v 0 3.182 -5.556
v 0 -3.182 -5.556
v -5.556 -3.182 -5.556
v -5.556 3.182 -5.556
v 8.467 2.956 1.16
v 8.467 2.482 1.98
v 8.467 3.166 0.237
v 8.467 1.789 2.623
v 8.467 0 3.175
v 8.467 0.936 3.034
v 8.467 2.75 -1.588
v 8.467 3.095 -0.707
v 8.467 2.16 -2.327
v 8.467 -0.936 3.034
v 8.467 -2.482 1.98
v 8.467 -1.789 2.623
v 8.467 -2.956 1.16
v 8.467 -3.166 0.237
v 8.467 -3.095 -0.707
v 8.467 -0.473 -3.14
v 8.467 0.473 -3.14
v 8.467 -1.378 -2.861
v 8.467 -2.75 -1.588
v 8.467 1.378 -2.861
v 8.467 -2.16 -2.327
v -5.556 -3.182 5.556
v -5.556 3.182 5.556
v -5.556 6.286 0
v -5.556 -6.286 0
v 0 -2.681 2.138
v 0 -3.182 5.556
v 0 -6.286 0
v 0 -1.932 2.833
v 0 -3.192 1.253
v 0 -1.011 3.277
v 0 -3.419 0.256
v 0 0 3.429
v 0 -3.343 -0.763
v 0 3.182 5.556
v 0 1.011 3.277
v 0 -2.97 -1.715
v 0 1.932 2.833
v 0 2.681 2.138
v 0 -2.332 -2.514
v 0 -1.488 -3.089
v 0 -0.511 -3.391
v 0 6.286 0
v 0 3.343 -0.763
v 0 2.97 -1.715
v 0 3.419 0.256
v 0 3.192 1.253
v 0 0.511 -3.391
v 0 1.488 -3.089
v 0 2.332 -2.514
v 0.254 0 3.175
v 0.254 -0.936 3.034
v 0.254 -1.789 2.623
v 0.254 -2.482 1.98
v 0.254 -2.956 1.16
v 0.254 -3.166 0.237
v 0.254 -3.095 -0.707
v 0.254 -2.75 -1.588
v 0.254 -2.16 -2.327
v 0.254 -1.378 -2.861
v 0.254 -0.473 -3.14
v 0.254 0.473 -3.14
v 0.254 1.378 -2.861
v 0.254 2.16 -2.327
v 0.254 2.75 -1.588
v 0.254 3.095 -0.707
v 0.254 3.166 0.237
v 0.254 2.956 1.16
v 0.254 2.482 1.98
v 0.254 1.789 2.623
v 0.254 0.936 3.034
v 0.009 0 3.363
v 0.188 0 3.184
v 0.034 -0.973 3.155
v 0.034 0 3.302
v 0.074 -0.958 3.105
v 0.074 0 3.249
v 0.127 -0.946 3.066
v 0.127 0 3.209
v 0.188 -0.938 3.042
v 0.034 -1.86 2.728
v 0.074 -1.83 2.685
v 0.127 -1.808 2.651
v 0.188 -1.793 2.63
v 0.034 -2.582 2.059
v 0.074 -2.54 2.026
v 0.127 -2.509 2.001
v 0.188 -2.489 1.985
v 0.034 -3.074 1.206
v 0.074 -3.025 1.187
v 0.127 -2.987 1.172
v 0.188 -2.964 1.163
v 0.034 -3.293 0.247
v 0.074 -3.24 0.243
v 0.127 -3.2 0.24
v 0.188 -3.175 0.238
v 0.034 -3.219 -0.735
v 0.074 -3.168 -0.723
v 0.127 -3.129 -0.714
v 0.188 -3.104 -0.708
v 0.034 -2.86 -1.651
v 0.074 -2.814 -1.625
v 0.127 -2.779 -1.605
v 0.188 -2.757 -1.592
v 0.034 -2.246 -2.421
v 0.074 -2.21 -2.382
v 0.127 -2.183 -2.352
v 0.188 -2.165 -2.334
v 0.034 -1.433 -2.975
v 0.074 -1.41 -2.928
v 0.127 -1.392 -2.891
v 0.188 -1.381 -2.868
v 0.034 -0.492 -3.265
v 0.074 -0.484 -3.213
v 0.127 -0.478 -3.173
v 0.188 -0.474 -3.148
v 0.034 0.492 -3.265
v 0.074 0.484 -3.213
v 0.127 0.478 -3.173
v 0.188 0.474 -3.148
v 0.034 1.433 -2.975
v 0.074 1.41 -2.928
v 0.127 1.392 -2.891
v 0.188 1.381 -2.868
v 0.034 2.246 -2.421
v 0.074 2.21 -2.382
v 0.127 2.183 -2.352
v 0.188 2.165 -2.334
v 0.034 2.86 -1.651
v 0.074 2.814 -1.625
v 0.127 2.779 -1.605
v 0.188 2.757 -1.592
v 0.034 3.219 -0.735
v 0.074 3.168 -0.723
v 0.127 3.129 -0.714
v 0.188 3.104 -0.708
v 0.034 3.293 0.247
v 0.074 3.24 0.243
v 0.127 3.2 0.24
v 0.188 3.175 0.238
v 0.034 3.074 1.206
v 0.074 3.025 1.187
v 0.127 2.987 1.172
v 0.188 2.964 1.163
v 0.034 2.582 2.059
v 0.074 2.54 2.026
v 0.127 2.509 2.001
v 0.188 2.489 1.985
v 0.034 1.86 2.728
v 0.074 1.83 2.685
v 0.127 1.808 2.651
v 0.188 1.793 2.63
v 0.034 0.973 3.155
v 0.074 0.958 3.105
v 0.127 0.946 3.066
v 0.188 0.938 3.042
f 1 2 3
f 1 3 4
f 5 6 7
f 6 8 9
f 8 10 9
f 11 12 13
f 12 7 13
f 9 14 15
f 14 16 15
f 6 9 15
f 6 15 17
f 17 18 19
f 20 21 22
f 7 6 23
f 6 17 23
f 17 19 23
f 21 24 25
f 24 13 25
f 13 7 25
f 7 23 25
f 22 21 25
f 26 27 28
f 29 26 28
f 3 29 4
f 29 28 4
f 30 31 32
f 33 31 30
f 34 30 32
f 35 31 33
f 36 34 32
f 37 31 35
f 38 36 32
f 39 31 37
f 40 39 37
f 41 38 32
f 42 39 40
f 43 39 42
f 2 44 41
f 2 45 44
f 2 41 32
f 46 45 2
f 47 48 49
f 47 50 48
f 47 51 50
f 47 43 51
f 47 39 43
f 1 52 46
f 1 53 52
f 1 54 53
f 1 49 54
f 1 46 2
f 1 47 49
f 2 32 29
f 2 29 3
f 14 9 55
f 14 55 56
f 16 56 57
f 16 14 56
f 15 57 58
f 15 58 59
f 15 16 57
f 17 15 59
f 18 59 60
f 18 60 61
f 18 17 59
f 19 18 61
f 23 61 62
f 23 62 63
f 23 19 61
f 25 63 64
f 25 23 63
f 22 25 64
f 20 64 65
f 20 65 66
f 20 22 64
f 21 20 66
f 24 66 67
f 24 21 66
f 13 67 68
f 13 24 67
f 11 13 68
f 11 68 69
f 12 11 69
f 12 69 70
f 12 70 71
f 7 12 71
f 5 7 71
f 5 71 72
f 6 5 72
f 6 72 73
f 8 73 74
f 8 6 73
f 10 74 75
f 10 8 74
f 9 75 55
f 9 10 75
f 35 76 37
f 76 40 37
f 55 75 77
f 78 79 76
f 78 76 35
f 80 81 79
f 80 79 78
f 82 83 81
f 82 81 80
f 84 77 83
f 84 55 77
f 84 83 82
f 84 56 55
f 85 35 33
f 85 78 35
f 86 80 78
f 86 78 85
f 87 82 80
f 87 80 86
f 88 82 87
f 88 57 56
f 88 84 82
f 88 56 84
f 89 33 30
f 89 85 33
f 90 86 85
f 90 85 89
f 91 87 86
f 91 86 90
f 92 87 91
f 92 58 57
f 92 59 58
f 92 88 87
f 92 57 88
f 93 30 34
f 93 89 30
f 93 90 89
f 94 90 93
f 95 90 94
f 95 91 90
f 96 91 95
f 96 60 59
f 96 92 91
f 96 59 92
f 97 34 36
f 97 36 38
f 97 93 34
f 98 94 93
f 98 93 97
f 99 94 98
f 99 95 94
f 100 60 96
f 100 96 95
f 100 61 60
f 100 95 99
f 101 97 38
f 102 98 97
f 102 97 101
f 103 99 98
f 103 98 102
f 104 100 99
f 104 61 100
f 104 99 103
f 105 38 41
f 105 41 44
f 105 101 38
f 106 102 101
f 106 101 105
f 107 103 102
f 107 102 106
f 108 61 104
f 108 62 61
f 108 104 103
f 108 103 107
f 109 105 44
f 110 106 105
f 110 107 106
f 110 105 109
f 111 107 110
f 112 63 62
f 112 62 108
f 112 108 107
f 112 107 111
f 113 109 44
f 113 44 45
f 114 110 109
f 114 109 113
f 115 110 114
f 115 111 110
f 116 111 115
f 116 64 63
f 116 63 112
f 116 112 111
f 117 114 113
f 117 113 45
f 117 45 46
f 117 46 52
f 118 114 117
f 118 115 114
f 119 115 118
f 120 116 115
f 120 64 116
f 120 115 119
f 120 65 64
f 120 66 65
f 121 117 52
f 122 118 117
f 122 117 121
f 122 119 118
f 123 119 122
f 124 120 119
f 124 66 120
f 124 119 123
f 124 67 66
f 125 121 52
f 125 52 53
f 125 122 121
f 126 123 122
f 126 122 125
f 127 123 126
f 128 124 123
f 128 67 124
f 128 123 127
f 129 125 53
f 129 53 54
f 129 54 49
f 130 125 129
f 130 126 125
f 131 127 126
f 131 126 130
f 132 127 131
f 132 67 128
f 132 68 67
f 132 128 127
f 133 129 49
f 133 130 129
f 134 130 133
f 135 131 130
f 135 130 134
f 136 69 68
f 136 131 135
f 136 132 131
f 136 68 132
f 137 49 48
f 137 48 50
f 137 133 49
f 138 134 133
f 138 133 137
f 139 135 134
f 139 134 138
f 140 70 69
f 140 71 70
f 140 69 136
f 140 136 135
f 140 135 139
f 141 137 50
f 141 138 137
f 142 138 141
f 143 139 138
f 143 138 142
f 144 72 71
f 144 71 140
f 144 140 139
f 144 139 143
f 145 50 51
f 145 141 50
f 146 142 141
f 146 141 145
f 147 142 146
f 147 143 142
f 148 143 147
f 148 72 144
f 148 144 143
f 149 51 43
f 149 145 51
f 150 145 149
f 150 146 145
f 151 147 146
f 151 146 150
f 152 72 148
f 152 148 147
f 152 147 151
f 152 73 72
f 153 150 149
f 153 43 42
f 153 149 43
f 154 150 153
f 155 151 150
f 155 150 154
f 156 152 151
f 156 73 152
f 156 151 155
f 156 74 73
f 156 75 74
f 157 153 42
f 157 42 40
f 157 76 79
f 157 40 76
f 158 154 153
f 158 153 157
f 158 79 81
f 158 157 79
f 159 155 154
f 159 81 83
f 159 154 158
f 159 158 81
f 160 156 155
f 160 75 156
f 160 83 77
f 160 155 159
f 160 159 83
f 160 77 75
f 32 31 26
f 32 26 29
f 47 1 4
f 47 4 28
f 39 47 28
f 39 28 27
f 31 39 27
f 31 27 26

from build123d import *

# Parameters (mm, degrees)
SKETCH1_W           = 8.466666667
SKETCH1_H           = 3.175
BOSS_EXTRUDE1_DEPTH = 5.55625
FILLET1_R           = 0.254


with BuildPart() as part:
    # Sketch1 → Revolve1 (revolve)
    with BuildSketch(Plane.XY, mode=Mode.PRIVATE) as revolve1_sk:
        with Locations((4.233333334, 1.5875)):
            Rectangle(SKETCH1_W, SKETCH1_H)
    revolve(revolve1_sk.sketch.rotate(Axis((-10.583333333, 0, 0), (1, 0, 0)), 90), axis=Axis((-10.583333333, 0, 0), (1, 0, 0)))

    # Sketch2 → Boss-Extrude1 (add)
    with BuildSketch(Plane.ZY):
        Polygon((-5.55625, -3.182294901), (-5.55625, 3.182294901), (0, 6.2865), (5.55625, 3.182294901), (5.55625, -3.182294901), (0, -6.2865), align=None)
    extrude(amount=BOSS_EXTRUDE1_DEPTH)

    # Fillet1
    fillet1_edges = [part.edges().sort_by_distance(p)[0] for p in [
        (0, 0, -3.175),
    ]]
    fillet(fillet1_edges, radius=FILLET1_R)


solid = part.part
